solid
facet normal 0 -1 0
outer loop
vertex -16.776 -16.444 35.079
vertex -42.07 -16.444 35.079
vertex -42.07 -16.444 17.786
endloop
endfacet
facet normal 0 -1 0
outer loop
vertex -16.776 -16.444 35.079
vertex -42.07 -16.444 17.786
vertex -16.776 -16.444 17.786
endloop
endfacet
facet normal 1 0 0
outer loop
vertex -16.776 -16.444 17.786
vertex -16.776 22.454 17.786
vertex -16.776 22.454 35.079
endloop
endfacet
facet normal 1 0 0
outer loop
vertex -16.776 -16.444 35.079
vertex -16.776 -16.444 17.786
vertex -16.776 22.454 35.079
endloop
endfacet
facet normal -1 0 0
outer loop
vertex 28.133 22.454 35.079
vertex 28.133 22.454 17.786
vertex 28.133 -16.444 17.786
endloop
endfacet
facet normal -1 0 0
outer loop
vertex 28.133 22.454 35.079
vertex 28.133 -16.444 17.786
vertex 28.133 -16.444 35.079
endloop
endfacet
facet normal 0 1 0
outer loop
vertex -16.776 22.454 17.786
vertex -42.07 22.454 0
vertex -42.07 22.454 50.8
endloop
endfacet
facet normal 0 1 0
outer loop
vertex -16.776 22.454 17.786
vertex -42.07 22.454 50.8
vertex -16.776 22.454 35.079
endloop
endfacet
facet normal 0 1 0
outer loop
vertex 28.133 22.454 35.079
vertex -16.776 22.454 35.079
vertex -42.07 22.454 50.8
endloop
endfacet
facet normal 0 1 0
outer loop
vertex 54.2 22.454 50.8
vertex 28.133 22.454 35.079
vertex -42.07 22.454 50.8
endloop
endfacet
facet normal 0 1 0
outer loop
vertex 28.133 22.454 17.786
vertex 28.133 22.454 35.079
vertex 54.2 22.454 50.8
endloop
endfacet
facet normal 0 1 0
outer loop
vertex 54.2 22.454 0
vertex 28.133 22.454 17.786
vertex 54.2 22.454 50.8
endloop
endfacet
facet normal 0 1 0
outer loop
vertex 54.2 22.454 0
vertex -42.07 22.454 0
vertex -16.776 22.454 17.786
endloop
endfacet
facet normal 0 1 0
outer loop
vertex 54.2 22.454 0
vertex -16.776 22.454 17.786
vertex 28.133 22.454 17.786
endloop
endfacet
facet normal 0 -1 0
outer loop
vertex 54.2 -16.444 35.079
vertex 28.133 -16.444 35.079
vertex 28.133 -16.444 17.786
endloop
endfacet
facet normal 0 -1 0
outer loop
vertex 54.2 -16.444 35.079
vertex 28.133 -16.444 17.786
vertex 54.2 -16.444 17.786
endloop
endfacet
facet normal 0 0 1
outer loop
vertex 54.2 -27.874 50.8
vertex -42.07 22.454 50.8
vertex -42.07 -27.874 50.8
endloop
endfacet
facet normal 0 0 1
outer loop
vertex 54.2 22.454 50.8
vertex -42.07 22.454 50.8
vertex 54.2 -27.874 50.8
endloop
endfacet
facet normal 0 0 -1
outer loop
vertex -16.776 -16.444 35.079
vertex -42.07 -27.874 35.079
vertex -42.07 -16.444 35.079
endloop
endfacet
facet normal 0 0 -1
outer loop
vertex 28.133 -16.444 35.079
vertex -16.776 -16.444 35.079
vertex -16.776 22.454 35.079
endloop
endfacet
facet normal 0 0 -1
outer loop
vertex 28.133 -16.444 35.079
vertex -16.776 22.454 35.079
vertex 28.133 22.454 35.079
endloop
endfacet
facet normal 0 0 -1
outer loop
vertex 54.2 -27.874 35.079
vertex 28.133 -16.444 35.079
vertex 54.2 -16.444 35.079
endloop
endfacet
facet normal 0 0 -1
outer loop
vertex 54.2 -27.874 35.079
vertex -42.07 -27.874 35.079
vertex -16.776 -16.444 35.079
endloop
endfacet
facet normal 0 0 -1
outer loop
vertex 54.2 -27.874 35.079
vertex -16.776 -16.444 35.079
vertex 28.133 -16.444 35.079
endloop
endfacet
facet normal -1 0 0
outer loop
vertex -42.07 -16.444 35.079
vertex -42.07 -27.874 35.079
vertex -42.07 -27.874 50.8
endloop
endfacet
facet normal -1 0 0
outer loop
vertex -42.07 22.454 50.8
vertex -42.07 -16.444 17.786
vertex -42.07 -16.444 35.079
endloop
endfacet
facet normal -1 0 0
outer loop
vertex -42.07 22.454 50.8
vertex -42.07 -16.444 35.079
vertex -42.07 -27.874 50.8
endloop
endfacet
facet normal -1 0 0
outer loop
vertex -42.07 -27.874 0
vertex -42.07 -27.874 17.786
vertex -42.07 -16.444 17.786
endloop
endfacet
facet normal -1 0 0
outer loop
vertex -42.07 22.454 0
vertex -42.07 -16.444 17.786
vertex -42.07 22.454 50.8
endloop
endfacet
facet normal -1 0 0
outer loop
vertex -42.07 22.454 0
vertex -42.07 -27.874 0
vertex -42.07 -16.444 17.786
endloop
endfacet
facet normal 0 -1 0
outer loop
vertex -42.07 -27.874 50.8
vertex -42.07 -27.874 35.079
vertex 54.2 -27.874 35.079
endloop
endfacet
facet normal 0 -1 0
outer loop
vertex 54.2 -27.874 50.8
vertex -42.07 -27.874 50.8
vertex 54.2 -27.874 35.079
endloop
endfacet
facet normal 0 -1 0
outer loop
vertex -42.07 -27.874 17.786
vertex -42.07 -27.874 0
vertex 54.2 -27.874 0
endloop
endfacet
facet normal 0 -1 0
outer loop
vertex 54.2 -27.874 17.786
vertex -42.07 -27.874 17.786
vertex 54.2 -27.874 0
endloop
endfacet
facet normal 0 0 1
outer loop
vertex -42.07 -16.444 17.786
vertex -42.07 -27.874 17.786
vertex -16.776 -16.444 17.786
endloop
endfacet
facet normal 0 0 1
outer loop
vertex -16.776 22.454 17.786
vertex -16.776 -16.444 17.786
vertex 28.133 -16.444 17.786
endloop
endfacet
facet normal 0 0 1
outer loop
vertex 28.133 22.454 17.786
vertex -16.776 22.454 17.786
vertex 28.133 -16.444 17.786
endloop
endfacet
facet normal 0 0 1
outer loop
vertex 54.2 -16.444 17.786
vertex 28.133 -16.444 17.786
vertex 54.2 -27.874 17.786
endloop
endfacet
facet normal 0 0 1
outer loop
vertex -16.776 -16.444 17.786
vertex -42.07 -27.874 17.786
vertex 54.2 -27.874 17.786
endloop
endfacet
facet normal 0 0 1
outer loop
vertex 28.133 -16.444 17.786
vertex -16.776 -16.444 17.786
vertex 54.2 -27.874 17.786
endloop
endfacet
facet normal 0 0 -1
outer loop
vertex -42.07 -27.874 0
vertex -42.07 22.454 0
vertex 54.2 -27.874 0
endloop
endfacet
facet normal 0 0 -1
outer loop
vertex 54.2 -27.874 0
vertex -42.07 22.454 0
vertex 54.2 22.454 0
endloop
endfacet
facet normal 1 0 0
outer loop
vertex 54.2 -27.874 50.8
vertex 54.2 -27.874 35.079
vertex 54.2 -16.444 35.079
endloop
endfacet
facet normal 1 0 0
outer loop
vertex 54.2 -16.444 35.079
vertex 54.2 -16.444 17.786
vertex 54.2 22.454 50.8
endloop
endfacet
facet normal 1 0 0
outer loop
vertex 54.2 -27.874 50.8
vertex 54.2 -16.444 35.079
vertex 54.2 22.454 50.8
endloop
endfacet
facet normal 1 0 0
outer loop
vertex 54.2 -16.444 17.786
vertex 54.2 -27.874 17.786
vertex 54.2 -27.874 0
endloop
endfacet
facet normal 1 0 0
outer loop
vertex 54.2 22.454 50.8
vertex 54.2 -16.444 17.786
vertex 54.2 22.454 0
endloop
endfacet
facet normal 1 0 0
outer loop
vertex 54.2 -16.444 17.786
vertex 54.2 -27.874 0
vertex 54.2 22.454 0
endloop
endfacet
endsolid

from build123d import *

# Parameters (mm, degrees)
F0_W     = 96.270095
F0_H     = 50.328871
F1_DEPTH = 50.8
F2_W     = 96.270095
F2_H     = 17.292487
F3_DEPTH = 11.43
F4_W     = 44.908839
F4_H     = 17.292487
F5_DEPTH = 70.104


with BuildPart() as f1:
    # F0 (on Top) → F1 (new body)
    with BuildSketch(Plane.XY):
        with Locations((6.065273, -2.710015)):
            Rectangle(F0_W, F0_H)
    extrude(amount=F1_DEPTH)

    # F2 (on face) → F3 (cut)
    with BuildSketch(Plane.XZ.offset(27.874451)):
        with Locations((6.065273, 26.432386)):
            Rectangle(F2_W, F2_H)
    extrude(amount=-F3_DEPTH, mode=Mode.SUBTRACT)

    # F4 (on face) → F5 (cut)
    with BuildSketch(Plane.XZ.offset(16.444451)):
        with Locations((5.678129, 26.432386)):
            Rectangle(F4_W, F4_H)
    extrude(amount=-F5_DEPTH, mode=Mode.SUBTRACT)


solid = f1.part
